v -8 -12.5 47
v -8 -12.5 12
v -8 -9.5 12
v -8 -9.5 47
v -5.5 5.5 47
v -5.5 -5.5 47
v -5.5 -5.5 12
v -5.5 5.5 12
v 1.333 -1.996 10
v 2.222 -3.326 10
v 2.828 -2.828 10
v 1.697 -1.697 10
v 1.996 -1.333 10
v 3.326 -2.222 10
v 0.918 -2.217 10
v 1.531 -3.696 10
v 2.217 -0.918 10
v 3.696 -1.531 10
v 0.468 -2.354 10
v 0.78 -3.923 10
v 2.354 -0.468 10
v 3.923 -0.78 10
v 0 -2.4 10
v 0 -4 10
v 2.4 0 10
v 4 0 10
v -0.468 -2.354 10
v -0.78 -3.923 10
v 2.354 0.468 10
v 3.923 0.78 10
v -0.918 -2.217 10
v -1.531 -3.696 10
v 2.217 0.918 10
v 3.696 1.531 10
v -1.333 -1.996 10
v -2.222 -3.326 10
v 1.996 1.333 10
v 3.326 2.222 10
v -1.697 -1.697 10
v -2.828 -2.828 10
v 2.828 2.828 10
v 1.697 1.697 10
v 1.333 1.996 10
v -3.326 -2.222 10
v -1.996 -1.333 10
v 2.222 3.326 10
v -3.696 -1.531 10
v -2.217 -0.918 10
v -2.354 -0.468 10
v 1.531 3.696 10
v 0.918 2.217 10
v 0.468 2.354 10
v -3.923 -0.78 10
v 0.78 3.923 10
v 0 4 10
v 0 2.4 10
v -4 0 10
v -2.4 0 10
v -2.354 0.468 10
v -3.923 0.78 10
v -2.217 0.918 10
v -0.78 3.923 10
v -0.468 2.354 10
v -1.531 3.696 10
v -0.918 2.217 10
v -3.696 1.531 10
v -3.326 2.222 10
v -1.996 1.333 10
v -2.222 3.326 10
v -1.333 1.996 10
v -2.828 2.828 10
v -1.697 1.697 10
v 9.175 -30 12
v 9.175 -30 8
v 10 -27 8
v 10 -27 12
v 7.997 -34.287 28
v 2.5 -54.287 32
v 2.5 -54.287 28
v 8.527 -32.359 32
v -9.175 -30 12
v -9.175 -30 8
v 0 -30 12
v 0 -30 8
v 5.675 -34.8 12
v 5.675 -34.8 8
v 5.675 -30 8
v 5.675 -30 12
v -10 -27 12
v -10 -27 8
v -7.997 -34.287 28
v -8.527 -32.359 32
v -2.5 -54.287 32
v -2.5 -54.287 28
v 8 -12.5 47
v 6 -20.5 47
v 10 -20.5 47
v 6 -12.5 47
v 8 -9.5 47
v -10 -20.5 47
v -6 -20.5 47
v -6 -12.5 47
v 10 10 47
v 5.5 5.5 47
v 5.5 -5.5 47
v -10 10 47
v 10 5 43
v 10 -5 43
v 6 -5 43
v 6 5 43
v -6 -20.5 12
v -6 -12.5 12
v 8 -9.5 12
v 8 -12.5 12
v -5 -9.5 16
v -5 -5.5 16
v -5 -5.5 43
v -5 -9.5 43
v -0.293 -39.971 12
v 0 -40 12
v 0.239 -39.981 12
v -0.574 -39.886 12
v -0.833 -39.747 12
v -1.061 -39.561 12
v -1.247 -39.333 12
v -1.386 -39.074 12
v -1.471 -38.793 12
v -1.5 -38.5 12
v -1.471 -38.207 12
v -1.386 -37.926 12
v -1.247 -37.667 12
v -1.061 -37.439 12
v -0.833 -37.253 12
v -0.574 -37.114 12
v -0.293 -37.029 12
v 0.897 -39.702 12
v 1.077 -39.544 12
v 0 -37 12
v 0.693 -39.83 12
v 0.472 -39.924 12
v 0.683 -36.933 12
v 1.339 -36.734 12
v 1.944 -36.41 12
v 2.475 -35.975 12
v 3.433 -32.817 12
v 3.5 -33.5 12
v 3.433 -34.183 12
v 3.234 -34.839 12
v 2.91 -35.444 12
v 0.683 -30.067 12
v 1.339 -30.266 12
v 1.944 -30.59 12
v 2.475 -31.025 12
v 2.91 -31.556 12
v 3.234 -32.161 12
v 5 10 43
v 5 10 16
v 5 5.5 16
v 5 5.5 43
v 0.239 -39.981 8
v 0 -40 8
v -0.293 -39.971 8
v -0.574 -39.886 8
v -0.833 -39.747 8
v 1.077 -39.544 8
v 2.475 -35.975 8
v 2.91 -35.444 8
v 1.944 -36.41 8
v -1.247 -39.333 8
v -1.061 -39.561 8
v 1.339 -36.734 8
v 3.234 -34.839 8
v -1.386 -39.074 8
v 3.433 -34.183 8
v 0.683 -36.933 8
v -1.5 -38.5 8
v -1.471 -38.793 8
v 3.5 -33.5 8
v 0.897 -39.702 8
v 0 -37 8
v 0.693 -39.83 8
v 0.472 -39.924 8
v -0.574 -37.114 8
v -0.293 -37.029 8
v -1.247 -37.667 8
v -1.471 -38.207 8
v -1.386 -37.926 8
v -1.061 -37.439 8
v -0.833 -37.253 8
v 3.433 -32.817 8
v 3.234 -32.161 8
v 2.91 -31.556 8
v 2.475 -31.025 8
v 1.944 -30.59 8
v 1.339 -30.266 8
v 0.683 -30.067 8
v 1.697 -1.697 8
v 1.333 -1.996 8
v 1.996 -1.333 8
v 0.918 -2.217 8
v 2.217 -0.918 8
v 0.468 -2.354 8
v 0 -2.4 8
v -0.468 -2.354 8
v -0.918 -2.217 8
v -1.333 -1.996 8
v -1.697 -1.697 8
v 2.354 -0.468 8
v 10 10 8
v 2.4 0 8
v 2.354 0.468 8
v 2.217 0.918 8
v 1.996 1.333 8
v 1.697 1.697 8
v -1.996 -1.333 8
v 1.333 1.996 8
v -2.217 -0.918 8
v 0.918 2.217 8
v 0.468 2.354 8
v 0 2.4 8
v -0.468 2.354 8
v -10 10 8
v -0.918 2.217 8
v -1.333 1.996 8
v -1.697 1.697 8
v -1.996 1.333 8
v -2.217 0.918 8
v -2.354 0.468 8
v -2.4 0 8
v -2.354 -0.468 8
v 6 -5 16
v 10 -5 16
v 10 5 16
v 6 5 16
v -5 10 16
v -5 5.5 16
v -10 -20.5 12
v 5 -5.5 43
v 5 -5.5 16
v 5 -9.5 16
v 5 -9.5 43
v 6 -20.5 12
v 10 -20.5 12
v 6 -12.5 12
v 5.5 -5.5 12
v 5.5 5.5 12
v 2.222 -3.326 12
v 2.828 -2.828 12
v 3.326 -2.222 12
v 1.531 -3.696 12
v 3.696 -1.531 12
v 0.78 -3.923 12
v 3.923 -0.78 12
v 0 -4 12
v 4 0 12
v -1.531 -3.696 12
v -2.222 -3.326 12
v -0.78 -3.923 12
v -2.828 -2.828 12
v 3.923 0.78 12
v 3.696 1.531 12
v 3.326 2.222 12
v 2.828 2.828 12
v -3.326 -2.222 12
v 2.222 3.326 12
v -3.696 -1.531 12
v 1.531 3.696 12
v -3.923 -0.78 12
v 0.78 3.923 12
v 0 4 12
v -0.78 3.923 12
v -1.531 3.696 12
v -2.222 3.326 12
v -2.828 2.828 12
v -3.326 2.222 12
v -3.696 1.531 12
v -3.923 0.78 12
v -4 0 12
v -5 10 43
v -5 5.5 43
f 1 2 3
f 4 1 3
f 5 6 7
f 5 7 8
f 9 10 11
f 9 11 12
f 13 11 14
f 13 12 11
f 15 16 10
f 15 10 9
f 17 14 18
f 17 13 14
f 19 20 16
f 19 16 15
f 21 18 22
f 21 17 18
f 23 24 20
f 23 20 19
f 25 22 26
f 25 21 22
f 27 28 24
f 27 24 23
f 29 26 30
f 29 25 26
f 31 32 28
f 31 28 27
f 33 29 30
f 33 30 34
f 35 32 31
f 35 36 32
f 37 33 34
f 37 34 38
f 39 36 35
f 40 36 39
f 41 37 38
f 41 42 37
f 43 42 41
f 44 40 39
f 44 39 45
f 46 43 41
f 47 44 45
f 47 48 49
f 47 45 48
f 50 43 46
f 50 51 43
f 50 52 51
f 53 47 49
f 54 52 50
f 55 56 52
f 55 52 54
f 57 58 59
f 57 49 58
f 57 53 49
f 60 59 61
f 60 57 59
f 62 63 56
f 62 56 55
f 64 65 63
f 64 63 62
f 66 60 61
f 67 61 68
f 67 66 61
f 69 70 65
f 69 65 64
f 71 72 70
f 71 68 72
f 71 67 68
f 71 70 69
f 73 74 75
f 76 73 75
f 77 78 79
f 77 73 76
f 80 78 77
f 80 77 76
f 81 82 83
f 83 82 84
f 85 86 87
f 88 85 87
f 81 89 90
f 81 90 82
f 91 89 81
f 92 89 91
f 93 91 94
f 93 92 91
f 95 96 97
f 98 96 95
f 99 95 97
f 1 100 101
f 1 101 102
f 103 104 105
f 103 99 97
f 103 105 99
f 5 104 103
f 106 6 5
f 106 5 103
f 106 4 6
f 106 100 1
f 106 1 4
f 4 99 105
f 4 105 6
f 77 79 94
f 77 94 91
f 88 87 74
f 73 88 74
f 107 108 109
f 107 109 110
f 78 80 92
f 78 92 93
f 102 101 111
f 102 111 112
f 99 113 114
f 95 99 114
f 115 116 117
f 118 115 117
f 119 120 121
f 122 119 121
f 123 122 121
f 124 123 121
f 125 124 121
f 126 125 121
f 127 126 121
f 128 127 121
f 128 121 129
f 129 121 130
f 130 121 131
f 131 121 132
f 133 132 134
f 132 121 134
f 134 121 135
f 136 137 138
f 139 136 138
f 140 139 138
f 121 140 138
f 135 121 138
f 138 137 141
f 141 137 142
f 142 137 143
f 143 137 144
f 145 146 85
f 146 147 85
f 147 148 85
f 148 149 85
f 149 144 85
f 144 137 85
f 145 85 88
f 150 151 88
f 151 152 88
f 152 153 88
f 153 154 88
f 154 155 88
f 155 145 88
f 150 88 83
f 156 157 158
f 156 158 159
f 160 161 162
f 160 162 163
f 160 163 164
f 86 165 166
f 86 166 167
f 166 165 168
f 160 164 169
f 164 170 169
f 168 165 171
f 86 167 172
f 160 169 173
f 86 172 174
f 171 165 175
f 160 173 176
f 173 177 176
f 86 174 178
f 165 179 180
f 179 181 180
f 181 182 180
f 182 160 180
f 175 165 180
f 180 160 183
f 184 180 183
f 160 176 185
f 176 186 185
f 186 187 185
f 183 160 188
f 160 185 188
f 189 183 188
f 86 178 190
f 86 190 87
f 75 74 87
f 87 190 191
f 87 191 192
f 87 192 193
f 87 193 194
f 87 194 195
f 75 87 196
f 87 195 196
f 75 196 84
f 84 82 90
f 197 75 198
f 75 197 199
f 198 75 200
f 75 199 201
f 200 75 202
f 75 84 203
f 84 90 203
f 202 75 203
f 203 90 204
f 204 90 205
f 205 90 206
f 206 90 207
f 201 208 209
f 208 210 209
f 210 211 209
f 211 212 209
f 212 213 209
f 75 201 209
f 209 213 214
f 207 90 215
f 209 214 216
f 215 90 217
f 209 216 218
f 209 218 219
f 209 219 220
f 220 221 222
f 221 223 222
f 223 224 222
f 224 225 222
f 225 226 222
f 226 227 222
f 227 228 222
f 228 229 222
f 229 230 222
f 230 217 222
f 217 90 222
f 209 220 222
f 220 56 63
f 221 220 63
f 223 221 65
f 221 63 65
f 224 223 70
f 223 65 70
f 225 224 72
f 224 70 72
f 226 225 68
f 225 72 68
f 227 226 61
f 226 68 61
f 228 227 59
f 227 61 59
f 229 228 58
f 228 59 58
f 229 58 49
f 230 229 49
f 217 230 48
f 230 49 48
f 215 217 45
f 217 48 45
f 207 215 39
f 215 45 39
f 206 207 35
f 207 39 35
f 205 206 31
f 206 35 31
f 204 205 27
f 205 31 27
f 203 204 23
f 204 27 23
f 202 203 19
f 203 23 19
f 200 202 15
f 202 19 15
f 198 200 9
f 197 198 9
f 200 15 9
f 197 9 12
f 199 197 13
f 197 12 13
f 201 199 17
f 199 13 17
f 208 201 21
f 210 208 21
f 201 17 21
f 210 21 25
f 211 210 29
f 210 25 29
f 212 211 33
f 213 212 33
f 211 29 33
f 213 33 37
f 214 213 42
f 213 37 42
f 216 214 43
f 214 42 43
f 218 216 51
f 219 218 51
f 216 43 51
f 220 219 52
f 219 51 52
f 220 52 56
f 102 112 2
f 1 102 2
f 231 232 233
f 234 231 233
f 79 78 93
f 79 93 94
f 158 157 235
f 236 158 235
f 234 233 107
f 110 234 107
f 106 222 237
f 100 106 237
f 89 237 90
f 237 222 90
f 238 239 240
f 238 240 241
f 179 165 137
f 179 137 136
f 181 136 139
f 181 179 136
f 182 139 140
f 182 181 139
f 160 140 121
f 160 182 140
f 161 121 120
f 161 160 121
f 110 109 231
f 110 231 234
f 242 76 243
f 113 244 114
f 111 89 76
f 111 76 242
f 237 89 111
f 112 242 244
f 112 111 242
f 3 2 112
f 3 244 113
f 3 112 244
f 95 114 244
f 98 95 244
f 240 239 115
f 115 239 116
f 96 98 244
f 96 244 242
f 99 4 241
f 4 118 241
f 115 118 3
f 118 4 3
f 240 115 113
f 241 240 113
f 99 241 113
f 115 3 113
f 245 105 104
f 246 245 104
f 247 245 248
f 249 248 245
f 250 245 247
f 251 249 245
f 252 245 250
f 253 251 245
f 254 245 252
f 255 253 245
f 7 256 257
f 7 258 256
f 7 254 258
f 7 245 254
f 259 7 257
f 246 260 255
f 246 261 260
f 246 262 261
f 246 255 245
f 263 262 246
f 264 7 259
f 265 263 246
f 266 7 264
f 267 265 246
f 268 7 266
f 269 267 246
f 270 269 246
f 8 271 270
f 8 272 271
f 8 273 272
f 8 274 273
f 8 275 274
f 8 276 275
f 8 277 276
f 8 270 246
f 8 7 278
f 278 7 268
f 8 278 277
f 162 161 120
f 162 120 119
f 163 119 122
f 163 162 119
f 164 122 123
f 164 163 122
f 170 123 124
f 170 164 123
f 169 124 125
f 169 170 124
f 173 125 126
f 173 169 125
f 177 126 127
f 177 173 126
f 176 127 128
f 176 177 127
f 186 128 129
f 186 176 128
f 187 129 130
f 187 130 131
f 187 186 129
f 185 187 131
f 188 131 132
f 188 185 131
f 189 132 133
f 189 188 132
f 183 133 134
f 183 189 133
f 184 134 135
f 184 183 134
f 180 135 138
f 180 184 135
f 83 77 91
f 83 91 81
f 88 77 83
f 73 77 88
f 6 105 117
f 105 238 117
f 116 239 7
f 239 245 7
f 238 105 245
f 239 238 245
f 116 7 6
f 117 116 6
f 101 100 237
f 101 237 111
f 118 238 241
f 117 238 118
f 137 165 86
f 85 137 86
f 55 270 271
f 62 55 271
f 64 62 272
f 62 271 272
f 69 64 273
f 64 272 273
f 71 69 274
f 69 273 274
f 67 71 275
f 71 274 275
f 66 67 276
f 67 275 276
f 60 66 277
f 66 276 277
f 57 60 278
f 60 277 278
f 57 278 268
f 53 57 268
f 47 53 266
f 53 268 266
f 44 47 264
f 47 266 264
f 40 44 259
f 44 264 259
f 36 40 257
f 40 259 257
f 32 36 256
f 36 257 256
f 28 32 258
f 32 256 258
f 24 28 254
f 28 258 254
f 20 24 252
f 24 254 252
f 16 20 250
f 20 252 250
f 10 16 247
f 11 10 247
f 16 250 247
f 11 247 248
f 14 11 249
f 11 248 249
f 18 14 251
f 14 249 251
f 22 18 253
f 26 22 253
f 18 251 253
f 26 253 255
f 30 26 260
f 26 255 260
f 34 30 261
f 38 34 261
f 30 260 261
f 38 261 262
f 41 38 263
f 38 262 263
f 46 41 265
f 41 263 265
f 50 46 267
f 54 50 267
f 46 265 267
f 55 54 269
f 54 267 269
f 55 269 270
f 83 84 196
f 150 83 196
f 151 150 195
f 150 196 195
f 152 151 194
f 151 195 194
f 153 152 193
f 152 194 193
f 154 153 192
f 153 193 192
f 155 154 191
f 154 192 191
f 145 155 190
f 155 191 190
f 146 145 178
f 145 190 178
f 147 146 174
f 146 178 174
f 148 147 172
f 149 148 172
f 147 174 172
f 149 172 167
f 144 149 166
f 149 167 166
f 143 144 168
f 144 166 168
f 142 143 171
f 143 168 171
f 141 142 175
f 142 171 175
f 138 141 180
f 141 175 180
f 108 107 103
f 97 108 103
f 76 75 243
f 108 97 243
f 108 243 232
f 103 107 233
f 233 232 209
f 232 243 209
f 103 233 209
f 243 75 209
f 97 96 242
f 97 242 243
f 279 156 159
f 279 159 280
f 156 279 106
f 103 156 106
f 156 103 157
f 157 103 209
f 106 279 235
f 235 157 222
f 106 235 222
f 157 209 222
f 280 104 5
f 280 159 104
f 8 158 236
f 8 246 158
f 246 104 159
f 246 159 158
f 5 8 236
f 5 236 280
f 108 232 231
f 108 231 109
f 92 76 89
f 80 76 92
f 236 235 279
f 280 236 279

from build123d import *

# Parameters (mm, degrees)
SKETCH002_W             = 50
SKETCH002_H             = 20
PAD001_DEPTH            = 4
SKETCH003_R             = 4
POCKET001_DEPTH         = 2
SKETCH004_R             = 2.4
POCKET002_DEPTH         = 2
SKETCH016_W             = 11
SKETCH016_H             = 11
SKETCH016_W_2           = 33
SKETCH016_H_2           = 20
PAD007_DEPTH            = 35
SKETCH017_W             = 10
SKETCH017_H             = 27
POCKET009_DEPTH         = 20
SKETCH018_W             = 10
SKETCH018_H             = 27
POCKET010_DEPTH         = 4
POCKET011_DEPTH         = 20
POCKET016_DEPTH         = 25
POCKET017_DEPTH         = 4
POCKET018_DEPTH         = 4
BODY002_PLACEMENT_ANGLE = 90.0000000001


with BuildPart() as part:
    # Sketch002 (on Face1 of CopyPocket) → Pad001 (new body)
    with BuildSketch(Plane.XY.offset(8)):
        with Locations((-15, 0)):
            Rectangle(SKETCH002_W, SKETCH002_H)
    extrude(amount=PAD001_DEPTH)

    # Sketch003 (on Face6 of Pad001) → Pocket001 (cut)
    with BuildSketch(Plane.XY.offset(12)):
        Circle(SKETCH003_R)
    extrude(amount=-POCKET001_DEPTH, mode=Mode.SUBTRACT)

    # Sketch004 (on Face8 of Pocket001) → Pocket002 (cut)
    with BuildSketch(Plane.XY.offset(10)):
        Circle(SKETCH004_R)
    extrude(amount=-POCKET002_DEPTH, mode=Mode.SUBTRACT)

    # Sketch016 (on Face5 of Pocket002) → Pad007 (join)
    with BuildSketch(Plane.XY.offset(12)):
        Polygon((10, -10), (10, 10), (-20.5, 10), (-20.5, 6), (-12.5, 6), (-12.5, 8), (-9.5, 8), (-9.5, -8), (-12.5, -8), (-12.5, -6), (-20.5, -6), (-20.5, -10), align=None)
        Rectangle(SKETCH016_W, SKETCH016_H, mode=Mode.SUBTRACT)
        with Locations((-43.5, 0)):
            Rectangle(SKETCH016_W_2, SKETCH016_H_2)
    extrude(amount=PAD007_DEPTH)

    # Sketch017 (on Face7 of Pad007) → Pocket009 (cut)
    with BuildSketch(Plane.YZ.offset(10)):
        with Locations((0, 29.5)):
            Rectangle(SKETCH017_W, SKETCH017_H)
    extrude(amount=-POCKET009_DEPTH, mode=Mode.SUBTRACT)

    # Sketch018 (on Face10 of Pocket009) → Pocket010 (cut)
    with BuildSketch(Plane.XZ.offset(10)):
        with Locations((0, 29.5)):
            Rectangle(SKETCH018_W, SKETCH018_H)
    extrude(amount=-POCKET010_DEPTH, mode=Mode.SUBTRACT)

    # Sketch019 (on Face8 of Pocket010) → Pocket011 (cut)
    with BuildSketch(Plane.XZ.offset(10)):
        Polygon((-27, 12), (-32.3589838486, 32), (-54.2871870789, 32), (-54.2871870789, 28), (-34.2871870789, 28), (-30, 12), (-40, 12), (-60, 12), (-60, 47), (-27, 47), align=None)
    extrude(amount=-POCKET011_DEPTH, mode=Mode.SUBTRACT)

    # Sketch027 (on Face22 of Pocket011) → Pocket016 (cut)
    with BuildSketch(Plane.XY.offset(32)):
        Polygon((-54.2871870789, -10), (-54.2871870789, -2.5), (-27, -10), align=None)
        Polygon((-54.2871870789, 2.5), (-54.2871870789, 10), (-27, 10), align=None)
    extrude(amount=-POCKET016_DEPTH, mode=Mode.SUBTRACT)

    # Sketch028 (on Face1 of Pocket016) → Pocket017 (cut)
    with BuildSketch(Plane(origin=(0, 0, 8), x_dir=(1, 0, 0), z_dir=(0, 0, -1))):
        with BuildLine():
            Line((-39.5440001666, 1.0770625108), (-34.8, 5.6754371773))
            Line((-34.8, 5.6754371773), (-30, 5.6754371773))
            Line((-30, 5.6754371773), (-30, 9.1754371773))
            Line((-30, 9.1754371773), (-40, 6.4268944352))
            Line((-40, 0), (-40, 6.4268944352))
            ThreePointArc((-39.5440001666, 1.0770625108), (-39.8813037772, 0.5848075539), (-40, 0))
        make_face()
    extrude(amount=-POCKET017_DEPTH, mode=Mode.SUBTRACT)

    # Sketch029 (on Face1 of Pocket017) → Pocket018 (cut)
    with BuildSketch(Plane(origin=(0, 0, 8), x_dir=(1, 0, 0), z_dir=(0, 0, -1))):
        with BuildLine():
            ThreePointArc((-40, 0), (-38.5, -1.5), (-37, 0))
            ThreePointArc((-30, 0), (-33.5, 3.5), (-37, 0))
            Line((-30, -9.1754371773), (-30, 0))
            Line((-40, -6.4268944352), (-30, -9.1754371773))
            Line((-40, 0), (-40, -6.4268944352))
        make_face()
    extrude(amount=-POCKET018_DEPTH, mode=Mode.SUBTRACT)


with BuildPart() as part_1:
    # Body002 placement: moved
    add(part.part.rotate(Axis((0, 0, 0), (0, 0, 1)), BODY002_PLACEMENT_ANGLE))


solid = part_1.part
